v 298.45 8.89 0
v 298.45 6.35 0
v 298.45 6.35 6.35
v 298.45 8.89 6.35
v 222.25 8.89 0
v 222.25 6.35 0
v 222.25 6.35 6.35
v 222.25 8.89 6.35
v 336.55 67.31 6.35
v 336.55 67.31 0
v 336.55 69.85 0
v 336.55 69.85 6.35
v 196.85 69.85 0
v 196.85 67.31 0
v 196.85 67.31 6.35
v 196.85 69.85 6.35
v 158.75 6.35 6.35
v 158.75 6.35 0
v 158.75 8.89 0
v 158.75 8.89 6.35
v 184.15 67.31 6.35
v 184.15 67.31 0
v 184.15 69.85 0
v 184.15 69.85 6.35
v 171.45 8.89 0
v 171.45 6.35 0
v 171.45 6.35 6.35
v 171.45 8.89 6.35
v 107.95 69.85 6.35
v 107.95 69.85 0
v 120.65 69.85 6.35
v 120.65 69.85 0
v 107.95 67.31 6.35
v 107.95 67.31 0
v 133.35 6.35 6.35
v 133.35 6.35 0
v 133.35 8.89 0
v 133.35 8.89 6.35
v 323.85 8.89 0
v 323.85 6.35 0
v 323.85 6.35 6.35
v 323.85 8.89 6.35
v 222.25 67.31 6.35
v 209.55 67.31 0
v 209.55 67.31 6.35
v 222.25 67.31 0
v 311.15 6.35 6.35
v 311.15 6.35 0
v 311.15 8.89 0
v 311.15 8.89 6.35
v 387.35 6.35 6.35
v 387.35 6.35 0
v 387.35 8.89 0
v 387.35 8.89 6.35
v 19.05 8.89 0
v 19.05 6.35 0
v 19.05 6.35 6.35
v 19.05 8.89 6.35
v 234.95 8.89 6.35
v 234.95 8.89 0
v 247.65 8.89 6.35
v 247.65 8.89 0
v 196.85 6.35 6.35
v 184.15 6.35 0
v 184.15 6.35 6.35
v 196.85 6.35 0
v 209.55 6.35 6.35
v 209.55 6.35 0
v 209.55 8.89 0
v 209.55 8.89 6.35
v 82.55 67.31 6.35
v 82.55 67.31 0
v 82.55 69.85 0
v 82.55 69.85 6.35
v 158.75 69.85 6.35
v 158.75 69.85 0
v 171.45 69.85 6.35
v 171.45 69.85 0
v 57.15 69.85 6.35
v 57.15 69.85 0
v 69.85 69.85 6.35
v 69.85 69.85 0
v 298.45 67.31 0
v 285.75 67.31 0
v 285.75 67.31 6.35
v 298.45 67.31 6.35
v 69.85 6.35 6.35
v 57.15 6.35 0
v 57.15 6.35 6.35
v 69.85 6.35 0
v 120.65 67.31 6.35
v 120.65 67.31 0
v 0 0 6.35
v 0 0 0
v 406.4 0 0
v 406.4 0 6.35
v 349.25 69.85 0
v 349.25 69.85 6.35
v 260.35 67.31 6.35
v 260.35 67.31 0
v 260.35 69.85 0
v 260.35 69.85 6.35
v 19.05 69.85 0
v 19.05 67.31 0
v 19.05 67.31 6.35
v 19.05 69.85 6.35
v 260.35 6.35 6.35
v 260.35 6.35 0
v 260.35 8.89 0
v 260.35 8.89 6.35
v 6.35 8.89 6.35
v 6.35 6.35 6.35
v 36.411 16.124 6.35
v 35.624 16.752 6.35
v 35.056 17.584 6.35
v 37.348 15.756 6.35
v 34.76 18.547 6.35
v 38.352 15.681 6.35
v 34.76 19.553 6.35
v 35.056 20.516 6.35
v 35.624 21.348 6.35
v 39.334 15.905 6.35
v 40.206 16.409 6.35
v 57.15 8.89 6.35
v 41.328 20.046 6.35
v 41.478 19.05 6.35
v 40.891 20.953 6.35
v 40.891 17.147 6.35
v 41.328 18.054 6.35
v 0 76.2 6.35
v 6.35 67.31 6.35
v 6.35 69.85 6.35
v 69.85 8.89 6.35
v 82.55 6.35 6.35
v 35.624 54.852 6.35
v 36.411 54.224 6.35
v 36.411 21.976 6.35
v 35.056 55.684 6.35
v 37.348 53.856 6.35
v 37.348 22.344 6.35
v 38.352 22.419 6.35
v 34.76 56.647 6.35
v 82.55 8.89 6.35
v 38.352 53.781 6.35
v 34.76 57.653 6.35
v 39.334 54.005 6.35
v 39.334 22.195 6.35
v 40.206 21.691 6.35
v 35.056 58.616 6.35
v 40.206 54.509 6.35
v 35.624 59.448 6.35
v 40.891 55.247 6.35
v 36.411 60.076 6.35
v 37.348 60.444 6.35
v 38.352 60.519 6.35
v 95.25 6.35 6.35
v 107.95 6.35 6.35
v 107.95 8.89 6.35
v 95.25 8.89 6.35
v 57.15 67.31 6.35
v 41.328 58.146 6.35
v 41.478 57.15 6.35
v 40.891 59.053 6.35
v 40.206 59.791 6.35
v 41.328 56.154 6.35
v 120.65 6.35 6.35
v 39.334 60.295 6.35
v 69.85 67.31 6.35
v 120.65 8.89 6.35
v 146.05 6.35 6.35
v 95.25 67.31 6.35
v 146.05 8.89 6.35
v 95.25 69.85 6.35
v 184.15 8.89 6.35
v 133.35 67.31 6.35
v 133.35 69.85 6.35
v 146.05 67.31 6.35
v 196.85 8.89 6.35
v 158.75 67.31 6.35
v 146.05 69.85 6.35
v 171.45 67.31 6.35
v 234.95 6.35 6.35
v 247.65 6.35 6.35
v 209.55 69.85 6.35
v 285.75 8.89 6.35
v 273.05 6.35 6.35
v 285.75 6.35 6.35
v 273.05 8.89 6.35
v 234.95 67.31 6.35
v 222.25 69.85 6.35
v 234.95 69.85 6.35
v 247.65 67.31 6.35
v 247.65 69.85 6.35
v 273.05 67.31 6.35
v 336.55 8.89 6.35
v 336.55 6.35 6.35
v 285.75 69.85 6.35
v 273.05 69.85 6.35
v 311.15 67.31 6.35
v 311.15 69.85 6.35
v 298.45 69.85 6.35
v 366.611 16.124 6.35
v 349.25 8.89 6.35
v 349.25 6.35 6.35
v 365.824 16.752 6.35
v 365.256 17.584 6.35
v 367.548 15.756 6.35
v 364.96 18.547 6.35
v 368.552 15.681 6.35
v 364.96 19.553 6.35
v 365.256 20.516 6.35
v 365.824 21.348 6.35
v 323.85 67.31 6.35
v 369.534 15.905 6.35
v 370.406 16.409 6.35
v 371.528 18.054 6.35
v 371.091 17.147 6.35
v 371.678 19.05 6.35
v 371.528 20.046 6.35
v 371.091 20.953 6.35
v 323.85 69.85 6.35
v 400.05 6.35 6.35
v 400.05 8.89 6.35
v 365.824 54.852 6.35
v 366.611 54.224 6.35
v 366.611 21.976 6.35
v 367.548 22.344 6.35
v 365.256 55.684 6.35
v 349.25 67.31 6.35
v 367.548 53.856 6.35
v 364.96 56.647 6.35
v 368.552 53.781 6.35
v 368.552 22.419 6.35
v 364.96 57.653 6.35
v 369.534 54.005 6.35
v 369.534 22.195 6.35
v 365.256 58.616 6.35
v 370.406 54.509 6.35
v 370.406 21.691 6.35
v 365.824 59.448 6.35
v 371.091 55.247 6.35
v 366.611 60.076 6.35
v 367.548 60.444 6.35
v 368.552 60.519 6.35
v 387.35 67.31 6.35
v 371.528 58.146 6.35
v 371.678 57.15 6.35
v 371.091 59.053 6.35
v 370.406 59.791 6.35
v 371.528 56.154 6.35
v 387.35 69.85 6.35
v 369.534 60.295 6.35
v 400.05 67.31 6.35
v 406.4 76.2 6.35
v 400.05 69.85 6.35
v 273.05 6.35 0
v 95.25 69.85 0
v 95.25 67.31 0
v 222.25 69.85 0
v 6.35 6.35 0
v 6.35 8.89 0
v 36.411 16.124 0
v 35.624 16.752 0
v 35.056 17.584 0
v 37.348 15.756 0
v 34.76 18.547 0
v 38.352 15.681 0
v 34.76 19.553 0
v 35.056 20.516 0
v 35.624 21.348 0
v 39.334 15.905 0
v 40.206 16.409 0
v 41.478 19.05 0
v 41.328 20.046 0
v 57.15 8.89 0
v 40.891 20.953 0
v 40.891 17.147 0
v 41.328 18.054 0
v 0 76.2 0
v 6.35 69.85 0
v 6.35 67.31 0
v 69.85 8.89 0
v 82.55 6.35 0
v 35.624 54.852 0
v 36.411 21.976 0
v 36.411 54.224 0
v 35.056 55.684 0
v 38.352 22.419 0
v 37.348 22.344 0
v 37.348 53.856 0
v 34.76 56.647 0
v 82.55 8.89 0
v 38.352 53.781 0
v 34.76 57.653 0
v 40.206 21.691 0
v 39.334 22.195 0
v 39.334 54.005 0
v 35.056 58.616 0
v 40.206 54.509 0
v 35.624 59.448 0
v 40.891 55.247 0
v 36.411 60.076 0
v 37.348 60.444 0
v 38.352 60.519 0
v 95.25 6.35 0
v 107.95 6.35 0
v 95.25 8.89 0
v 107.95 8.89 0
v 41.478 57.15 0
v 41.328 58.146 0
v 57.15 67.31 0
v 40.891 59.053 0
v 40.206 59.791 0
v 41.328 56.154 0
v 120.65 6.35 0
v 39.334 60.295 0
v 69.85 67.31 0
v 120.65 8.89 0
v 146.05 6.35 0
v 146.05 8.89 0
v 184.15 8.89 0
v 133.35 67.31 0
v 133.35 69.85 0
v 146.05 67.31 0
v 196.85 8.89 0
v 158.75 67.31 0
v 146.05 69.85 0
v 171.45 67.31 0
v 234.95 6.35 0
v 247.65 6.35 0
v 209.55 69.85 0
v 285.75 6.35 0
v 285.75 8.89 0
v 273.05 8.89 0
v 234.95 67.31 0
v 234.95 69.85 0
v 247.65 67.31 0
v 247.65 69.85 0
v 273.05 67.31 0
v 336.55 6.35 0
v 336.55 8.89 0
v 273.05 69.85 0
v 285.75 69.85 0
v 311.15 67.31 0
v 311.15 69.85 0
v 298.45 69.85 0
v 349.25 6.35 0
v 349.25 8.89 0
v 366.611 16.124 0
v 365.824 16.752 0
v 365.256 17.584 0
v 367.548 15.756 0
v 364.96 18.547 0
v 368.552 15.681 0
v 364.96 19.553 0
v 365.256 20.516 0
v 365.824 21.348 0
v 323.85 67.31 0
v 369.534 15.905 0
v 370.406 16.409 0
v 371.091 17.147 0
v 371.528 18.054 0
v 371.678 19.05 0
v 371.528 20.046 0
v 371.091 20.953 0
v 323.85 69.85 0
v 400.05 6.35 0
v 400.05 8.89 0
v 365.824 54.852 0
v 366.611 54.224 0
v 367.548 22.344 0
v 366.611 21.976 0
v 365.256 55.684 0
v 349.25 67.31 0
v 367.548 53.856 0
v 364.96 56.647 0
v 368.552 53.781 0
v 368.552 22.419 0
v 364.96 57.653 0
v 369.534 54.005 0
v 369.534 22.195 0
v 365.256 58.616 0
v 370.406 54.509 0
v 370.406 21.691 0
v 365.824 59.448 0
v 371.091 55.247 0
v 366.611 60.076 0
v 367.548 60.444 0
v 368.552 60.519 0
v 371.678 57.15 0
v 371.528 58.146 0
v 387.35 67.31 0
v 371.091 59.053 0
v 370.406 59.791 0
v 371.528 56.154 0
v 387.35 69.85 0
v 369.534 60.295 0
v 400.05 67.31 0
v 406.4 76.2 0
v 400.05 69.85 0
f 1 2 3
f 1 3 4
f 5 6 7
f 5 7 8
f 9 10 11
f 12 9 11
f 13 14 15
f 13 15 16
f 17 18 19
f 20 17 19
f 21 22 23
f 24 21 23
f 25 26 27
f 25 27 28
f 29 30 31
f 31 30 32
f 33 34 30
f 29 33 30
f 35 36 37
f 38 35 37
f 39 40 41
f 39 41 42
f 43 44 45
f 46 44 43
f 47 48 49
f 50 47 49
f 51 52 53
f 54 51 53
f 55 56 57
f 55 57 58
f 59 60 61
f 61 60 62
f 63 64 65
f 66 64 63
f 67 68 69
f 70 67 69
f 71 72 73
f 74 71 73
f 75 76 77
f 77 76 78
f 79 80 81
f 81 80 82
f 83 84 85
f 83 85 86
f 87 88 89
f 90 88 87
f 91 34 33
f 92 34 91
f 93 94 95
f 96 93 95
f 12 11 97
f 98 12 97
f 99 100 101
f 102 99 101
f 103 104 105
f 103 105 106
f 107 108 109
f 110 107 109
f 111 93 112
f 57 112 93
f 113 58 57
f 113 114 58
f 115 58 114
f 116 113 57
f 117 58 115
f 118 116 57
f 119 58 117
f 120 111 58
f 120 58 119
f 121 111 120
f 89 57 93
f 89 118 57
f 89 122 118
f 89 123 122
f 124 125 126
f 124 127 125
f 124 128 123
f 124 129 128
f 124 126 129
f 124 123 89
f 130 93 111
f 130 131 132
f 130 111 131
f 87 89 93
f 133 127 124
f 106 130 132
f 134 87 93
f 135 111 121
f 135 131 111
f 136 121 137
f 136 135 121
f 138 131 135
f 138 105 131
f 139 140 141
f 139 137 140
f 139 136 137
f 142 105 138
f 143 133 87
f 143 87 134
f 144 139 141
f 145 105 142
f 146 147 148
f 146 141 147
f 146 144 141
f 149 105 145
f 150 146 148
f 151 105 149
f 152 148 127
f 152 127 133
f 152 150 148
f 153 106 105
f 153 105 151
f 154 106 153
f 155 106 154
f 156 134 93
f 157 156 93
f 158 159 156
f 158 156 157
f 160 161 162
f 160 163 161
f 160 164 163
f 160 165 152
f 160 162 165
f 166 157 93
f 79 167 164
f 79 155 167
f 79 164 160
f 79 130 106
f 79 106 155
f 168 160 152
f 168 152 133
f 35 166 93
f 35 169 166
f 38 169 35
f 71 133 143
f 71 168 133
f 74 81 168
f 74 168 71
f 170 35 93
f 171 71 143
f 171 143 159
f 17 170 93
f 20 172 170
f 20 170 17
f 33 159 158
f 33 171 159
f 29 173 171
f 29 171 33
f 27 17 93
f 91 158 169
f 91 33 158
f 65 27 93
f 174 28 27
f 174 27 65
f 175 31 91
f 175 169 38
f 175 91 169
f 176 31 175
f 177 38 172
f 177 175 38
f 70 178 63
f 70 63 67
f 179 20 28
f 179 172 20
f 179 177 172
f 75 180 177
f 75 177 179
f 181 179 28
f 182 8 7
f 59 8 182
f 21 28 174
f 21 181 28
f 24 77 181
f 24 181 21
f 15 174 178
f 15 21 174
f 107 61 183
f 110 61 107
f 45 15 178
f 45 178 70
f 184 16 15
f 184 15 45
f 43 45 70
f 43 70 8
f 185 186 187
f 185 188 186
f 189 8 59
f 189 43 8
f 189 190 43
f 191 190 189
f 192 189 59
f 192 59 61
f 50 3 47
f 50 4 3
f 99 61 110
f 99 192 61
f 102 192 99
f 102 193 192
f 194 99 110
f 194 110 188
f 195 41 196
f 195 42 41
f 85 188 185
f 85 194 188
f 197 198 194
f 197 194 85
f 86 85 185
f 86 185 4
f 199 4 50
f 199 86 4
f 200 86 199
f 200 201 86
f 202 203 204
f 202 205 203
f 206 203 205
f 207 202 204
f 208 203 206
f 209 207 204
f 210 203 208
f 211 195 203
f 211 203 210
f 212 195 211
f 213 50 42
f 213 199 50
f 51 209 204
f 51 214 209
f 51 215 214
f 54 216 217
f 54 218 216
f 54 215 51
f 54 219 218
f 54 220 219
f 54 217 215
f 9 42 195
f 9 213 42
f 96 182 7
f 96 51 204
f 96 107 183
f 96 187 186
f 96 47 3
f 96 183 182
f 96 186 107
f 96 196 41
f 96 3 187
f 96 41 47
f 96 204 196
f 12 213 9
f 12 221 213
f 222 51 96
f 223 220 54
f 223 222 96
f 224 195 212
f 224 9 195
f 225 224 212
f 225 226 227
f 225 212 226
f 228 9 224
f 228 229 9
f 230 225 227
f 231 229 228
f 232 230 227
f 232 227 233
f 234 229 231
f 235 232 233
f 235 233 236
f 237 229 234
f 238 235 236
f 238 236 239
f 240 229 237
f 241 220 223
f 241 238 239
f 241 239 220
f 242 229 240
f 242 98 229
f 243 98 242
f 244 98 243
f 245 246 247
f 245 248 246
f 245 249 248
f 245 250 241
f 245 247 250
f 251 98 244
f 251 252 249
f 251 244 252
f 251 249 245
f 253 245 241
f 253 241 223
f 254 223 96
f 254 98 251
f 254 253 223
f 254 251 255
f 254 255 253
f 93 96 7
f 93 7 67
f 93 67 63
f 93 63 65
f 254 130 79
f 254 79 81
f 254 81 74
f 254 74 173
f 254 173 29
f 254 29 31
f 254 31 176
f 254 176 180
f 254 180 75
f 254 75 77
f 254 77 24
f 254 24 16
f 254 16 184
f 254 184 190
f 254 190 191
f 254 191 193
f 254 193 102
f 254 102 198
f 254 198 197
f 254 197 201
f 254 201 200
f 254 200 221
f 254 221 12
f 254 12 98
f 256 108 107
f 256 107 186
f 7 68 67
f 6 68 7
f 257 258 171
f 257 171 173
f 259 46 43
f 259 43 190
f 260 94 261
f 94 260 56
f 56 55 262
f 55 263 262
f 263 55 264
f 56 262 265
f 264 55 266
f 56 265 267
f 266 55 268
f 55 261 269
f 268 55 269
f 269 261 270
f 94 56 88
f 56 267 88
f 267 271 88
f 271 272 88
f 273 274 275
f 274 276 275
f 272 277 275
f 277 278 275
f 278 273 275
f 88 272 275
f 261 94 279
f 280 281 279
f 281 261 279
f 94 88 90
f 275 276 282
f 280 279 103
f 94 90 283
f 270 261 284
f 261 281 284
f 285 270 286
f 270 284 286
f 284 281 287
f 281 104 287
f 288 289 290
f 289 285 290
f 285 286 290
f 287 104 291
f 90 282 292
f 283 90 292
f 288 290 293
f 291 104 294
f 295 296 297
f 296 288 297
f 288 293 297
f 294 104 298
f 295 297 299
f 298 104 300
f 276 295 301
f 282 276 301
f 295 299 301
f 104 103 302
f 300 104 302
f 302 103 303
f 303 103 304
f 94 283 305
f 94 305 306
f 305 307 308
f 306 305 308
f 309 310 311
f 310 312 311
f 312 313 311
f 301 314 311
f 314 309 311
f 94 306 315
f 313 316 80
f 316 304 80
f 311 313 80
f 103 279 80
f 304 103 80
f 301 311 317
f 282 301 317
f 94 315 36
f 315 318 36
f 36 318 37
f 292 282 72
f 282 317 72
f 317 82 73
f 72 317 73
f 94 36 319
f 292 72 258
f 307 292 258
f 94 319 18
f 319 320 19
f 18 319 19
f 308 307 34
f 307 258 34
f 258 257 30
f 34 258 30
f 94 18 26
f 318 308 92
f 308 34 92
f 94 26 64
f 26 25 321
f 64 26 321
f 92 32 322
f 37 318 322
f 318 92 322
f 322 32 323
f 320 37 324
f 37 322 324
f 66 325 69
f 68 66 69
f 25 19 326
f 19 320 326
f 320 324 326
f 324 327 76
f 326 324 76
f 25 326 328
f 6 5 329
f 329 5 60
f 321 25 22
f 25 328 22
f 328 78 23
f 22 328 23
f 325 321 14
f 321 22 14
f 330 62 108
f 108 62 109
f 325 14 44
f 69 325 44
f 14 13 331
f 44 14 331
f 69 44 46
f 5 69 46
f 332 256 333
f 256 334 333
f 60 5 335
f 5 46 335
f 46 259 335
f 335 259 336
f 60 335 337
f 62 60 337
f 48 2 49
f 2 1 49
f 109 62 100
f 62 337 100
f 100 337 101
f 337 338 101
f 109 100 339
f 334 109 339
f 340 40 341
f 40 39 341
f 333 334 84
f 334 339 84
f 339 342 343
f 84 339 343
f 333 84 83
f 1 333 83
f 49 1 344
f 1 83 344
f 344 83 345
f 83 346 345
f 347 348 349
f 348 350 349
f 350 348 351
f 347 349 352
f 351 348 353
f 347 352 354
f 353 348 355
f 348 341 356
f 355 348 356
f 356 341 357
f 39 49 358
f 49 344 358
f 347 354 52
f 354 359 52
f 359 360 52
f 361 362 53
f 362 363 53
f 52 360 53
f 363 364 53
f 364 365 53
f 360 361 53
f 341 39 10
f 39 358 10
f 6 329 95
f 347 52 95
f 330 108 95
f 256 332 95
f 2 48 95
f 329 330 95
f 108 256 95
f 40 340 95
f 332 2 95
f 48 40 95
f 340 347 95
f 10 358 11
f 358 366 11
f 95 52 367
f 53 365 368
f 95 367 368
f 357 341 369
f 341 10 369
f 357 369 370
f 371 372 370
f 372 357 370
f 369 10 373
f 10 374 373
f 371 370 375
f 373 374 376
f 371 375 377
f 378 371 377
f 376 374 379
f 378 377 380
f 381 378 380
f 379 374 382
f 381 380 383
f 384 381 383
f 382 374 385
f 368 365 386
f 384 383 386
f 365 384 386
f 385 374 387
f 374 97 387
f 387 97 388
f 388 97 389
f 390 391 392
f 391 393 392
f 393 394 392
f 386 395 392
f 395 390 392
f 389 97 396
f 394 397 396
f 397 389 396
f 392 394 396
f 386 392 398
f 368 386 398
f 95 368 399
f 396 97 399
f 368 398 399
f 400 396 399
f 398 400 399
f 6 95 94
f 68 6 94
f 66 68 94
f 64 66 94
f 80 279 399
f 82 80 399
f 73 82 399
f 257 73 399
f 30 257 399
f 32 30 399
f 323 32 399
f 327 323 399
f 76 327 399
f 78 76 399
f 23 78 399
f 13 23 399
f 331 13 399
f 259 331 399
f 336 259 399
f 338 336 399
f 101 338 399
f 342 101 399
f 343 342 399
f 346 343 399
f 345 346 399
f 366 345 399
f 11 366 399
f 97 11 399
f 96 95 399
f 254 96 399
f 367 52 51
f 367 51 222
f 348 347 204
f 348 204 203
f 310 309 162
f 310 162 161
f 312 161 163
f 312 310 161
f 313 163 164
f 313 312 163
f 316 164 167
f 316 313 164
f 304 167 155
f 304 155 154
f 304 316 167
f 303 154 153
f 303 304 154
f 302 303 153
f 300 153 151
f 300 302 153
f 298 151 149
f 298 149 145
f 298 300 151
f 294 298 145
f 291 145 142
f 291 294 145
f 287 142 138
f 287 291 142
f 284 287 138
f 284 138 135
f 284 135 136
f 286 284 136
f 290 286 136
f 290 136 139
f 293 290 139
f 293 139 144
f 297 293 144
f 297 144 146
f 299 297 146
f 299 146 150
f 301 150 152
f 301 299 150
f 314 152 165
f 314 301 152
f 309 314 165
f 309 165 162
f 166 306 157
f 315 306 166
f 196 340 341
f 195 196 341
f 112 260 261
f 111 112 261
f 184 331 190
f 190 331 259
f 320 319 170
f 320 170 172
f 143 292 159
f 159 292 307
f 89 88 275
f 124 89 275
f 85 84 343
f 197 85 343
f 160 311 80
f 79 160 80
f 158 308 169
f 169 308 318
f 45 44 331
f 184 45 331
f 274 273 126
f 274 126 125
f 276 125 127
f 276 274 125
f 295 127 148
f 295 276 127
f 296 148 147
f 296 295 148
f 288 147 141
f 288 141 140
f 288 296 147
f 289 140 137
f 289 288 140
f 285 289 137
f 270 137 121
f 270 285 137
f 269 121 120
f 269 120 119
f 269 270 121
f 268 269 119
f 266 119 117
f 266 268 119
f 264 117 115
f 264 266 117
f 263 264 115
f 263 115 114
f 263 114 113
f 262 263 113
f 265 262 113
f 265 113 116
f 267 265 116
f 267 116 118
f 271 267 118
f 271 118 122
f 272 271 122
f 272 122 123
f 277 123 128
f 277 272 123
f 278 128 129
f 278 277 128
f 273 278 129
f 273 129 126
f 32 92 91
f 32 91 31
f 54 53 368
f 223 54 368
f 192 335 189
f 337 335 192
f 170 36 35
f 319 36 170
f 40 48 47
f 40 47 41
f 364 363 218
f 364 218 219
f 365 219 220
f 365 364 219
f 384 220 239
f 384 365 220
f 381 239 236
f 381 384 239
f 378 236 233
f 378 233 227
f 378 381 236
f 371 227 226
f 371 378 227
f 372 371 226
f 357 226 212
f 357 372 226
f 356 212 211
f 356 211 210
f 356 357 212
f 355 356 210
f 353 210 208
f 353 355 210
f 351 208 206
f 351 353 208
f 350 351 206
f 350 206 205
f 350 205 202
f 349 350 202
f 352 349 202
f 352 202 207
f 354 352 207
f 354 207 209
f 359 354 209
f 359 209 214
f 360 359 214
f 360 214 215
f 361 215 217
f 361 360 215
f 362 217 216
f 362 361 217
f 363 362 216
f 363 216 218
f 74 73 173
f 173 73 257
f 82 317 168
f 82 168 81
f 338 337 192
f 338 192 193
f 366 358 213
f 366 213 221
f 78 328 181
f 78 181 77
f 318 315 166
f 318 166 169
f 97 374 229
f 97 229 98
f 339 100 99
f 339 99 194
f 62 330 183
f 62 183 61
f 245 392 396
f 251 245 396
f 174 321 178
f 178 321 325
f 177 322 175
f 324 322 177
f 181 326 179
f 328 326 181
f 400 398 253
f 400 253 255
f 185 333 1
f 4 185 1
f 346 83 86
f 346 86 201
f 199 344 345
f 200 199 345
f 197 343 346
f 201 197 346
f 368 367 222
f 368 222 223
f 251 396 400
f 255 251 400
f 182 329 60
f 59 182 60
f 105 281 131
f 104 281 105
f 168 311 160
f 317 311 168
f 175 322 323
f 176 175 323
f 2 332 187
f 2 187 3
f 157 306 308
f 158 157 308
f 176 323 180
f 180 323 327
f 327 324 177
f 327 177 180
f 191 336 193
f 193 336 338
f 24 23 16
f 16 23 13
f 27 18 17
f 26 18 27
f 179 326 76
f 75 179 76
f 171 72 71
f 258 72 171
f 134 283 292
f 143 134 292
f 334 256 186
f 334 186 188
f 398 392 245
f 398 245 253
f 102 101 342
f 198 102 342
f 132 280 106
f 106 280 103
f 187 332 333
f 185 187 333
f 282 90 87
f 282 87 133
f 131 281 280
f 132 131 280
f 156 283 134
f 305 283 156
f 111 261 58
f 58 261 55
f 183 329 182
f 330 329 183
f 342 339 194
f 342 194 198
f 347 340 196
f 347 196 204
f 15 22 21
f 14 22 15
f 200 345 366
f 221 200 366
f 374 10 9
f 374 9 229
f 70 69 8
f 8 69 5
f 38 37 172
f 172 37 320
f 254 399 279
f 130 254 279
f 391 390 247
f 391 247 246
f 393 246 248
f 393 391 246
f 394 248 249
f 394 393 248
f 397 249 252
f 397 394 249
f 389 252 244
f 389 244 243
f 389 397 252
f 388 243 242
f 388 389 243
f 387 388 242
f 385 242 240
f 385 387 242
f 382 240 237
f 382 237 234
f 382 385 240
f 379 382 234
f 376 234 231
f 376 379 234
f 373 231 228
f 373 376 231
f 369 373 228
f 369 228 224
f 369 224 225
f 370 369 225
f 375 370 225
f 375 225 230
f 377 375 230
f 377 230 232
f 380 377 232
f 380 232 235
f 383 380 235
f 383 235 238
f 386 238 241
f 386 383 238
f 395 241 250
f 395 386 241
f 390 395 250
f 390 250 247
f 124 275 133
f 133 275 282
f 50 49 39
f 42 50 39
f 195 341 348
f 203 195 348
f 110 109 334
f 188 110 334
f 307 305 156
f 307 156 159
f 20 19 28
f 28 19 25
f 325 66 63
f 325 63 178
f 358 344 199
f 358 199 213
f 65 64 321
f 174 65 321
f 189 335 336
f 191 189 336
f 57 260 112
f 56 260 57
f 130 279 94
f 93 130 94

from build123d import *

# Parameters (mm, degrees)
F0_W     = 12.7
F0_H     = 2.54
F0_R     = 3.3782
F1_DEPTH = 6.35


with BuildPart() as f1:
    # F0 (on Top) → F1 (new body)
    with BuildSketch(Plane.XY):
        Polygon((0, 69.85), (0, 0), (406.4, 0), (406.4, 76.2), (0, 76.2), align=None)
        with Locations((12.7, 7.62)):
            Rectangle(F0_W, F0_H, mode=Mode.SUBTRACT)
        with Locations((63.5, 7.62)):
            Rectangle(F0_W, F0_H, mode=Mode.SUBTRACT)
        with Locations((88.9, 7.62)):
            Rectangle(F0_W, F0_H, mode=Mode.SUBTRACT)
        with Locations((114.3, 7.62)):
            Rectangle(F0_W, F0_H, mode=Mode.SUBTRACT)
        with Locations((139.7, 7.62)):
            Rectangle(F0_W, F0_H, mode=Mode.SUBTRACT)
        with Locations((165.1, 7.62)):
            Rectangle(F0_W, F0_H, mode=Mode.SUBTRACT)
        with Locations((190.5, 7.62)):
            Rectangle(F0_W, F0_H, mode=Mode.SUBTRACT)
        with Locations((38.1, 19.05)):
            Circle(F0_R, mode=Mode.SUBTRACT)
        with Locations((215.9, 7.62)):
            Rectangle(F0_W, F0_H, mode=Mode.SUBTRACT)
        with Locations((241.3, 7.62)):
            Rectangle(F0_W, F0_H, mode=Mode.SUBTRACT)
        with Locations((266.7, 7.62)):
            Rectangle(F0_W, F0_H, mode=Mode.SUBTRACT)
        with Locations((292.1, 7.62)):
            Rectangle(F0_W, F0_H, mode=Mode.SUBTRACT)
        with Locations((317.5, 7.62)):
            Rectangle(F0_W, F0_H, mode=Mode.SUBTRACT)
        with Locations((342.9, 7.62)):
            Rectangle(F0_W, F0_H, mode=Mode.SUBTRACT)
        with Locations((393.7, 7.62)):
            Rectangle(F0_W, F0_H, mode=Mode.SUBTRACT)
        with Locations((368.3, 19.05)):
            Circle(F0_R, mode=Mode.SUBTRACT)
        with Locations((38.1, 57.15)):
            Circle(F0_R, mode=Mode.SUBTRACT)
        with Locations((12.7, 68.58)):
            Rectangle(F0_W, F0_H, mode=Mode.SUBTRACT)
        with Locations((63.5, 68.58)):
            Rectangle(F0_W, F0_H, mode=Mode.SUBTRACT)
        with Locations((88.9, 68.58)):
            Rectangle(F0_W, F0_H, mode=Mode.SUBTRACT)
        with Locations((114.3, 68.58)):
            Rectangle(F0_W, F0_H, mode=Mode.SUBTRACT)
        with Locations((139.7, 68.58)):
            Rectangle(F0_W, F0_H, mode=Mode.SUBTRACT)
        with Locations((165.1, 68.58)):
            Rectangle(F0_W, F0_H, mode=Mode.SUBTRACT)
        with Locations((190.5, 68.58)):
            Rectangle(F0_W, F0_H, mode=Mode.SUBTRACT)
        with Locations((215.9, 68.58)):
            Rectangle(F0_W, F0_H, mode=Mode.SUBTRACT)
        with Locations((241.3, 68.58)):
            Rectangle(F0_W, F0_H, mode=Mode.SUBTRACT)
        with Locations((266.7, 68.58)):
            Rectangle(F0_W, F0_H, mode=Mode.SUBTRACT)
        with Locations((292.1, 68.58)):
            Rectangle(F0_W, F0_H, mode=Mode.SUBTRACT)
        with Locations((368.3, 57.15)):
            Circle(F0_R, mode=Mode.SUBTRACT)
        with Locations((317.5, 68.58)):
            Rectangle(F0_W, F0_H, mode=Mode.SUBTRACT)
        with Locations((342.9, 68.58)):
            Rectangle(F0_W, F0_H, mode=Mode.SUBTRACT)
        with Locations((393.7, 68.58)):
            Rectangle(F0_W, F0_H, mode=Mode.SUBTRACT)
    extrude(amount=F1_DEPTH)


solid = f1.part
